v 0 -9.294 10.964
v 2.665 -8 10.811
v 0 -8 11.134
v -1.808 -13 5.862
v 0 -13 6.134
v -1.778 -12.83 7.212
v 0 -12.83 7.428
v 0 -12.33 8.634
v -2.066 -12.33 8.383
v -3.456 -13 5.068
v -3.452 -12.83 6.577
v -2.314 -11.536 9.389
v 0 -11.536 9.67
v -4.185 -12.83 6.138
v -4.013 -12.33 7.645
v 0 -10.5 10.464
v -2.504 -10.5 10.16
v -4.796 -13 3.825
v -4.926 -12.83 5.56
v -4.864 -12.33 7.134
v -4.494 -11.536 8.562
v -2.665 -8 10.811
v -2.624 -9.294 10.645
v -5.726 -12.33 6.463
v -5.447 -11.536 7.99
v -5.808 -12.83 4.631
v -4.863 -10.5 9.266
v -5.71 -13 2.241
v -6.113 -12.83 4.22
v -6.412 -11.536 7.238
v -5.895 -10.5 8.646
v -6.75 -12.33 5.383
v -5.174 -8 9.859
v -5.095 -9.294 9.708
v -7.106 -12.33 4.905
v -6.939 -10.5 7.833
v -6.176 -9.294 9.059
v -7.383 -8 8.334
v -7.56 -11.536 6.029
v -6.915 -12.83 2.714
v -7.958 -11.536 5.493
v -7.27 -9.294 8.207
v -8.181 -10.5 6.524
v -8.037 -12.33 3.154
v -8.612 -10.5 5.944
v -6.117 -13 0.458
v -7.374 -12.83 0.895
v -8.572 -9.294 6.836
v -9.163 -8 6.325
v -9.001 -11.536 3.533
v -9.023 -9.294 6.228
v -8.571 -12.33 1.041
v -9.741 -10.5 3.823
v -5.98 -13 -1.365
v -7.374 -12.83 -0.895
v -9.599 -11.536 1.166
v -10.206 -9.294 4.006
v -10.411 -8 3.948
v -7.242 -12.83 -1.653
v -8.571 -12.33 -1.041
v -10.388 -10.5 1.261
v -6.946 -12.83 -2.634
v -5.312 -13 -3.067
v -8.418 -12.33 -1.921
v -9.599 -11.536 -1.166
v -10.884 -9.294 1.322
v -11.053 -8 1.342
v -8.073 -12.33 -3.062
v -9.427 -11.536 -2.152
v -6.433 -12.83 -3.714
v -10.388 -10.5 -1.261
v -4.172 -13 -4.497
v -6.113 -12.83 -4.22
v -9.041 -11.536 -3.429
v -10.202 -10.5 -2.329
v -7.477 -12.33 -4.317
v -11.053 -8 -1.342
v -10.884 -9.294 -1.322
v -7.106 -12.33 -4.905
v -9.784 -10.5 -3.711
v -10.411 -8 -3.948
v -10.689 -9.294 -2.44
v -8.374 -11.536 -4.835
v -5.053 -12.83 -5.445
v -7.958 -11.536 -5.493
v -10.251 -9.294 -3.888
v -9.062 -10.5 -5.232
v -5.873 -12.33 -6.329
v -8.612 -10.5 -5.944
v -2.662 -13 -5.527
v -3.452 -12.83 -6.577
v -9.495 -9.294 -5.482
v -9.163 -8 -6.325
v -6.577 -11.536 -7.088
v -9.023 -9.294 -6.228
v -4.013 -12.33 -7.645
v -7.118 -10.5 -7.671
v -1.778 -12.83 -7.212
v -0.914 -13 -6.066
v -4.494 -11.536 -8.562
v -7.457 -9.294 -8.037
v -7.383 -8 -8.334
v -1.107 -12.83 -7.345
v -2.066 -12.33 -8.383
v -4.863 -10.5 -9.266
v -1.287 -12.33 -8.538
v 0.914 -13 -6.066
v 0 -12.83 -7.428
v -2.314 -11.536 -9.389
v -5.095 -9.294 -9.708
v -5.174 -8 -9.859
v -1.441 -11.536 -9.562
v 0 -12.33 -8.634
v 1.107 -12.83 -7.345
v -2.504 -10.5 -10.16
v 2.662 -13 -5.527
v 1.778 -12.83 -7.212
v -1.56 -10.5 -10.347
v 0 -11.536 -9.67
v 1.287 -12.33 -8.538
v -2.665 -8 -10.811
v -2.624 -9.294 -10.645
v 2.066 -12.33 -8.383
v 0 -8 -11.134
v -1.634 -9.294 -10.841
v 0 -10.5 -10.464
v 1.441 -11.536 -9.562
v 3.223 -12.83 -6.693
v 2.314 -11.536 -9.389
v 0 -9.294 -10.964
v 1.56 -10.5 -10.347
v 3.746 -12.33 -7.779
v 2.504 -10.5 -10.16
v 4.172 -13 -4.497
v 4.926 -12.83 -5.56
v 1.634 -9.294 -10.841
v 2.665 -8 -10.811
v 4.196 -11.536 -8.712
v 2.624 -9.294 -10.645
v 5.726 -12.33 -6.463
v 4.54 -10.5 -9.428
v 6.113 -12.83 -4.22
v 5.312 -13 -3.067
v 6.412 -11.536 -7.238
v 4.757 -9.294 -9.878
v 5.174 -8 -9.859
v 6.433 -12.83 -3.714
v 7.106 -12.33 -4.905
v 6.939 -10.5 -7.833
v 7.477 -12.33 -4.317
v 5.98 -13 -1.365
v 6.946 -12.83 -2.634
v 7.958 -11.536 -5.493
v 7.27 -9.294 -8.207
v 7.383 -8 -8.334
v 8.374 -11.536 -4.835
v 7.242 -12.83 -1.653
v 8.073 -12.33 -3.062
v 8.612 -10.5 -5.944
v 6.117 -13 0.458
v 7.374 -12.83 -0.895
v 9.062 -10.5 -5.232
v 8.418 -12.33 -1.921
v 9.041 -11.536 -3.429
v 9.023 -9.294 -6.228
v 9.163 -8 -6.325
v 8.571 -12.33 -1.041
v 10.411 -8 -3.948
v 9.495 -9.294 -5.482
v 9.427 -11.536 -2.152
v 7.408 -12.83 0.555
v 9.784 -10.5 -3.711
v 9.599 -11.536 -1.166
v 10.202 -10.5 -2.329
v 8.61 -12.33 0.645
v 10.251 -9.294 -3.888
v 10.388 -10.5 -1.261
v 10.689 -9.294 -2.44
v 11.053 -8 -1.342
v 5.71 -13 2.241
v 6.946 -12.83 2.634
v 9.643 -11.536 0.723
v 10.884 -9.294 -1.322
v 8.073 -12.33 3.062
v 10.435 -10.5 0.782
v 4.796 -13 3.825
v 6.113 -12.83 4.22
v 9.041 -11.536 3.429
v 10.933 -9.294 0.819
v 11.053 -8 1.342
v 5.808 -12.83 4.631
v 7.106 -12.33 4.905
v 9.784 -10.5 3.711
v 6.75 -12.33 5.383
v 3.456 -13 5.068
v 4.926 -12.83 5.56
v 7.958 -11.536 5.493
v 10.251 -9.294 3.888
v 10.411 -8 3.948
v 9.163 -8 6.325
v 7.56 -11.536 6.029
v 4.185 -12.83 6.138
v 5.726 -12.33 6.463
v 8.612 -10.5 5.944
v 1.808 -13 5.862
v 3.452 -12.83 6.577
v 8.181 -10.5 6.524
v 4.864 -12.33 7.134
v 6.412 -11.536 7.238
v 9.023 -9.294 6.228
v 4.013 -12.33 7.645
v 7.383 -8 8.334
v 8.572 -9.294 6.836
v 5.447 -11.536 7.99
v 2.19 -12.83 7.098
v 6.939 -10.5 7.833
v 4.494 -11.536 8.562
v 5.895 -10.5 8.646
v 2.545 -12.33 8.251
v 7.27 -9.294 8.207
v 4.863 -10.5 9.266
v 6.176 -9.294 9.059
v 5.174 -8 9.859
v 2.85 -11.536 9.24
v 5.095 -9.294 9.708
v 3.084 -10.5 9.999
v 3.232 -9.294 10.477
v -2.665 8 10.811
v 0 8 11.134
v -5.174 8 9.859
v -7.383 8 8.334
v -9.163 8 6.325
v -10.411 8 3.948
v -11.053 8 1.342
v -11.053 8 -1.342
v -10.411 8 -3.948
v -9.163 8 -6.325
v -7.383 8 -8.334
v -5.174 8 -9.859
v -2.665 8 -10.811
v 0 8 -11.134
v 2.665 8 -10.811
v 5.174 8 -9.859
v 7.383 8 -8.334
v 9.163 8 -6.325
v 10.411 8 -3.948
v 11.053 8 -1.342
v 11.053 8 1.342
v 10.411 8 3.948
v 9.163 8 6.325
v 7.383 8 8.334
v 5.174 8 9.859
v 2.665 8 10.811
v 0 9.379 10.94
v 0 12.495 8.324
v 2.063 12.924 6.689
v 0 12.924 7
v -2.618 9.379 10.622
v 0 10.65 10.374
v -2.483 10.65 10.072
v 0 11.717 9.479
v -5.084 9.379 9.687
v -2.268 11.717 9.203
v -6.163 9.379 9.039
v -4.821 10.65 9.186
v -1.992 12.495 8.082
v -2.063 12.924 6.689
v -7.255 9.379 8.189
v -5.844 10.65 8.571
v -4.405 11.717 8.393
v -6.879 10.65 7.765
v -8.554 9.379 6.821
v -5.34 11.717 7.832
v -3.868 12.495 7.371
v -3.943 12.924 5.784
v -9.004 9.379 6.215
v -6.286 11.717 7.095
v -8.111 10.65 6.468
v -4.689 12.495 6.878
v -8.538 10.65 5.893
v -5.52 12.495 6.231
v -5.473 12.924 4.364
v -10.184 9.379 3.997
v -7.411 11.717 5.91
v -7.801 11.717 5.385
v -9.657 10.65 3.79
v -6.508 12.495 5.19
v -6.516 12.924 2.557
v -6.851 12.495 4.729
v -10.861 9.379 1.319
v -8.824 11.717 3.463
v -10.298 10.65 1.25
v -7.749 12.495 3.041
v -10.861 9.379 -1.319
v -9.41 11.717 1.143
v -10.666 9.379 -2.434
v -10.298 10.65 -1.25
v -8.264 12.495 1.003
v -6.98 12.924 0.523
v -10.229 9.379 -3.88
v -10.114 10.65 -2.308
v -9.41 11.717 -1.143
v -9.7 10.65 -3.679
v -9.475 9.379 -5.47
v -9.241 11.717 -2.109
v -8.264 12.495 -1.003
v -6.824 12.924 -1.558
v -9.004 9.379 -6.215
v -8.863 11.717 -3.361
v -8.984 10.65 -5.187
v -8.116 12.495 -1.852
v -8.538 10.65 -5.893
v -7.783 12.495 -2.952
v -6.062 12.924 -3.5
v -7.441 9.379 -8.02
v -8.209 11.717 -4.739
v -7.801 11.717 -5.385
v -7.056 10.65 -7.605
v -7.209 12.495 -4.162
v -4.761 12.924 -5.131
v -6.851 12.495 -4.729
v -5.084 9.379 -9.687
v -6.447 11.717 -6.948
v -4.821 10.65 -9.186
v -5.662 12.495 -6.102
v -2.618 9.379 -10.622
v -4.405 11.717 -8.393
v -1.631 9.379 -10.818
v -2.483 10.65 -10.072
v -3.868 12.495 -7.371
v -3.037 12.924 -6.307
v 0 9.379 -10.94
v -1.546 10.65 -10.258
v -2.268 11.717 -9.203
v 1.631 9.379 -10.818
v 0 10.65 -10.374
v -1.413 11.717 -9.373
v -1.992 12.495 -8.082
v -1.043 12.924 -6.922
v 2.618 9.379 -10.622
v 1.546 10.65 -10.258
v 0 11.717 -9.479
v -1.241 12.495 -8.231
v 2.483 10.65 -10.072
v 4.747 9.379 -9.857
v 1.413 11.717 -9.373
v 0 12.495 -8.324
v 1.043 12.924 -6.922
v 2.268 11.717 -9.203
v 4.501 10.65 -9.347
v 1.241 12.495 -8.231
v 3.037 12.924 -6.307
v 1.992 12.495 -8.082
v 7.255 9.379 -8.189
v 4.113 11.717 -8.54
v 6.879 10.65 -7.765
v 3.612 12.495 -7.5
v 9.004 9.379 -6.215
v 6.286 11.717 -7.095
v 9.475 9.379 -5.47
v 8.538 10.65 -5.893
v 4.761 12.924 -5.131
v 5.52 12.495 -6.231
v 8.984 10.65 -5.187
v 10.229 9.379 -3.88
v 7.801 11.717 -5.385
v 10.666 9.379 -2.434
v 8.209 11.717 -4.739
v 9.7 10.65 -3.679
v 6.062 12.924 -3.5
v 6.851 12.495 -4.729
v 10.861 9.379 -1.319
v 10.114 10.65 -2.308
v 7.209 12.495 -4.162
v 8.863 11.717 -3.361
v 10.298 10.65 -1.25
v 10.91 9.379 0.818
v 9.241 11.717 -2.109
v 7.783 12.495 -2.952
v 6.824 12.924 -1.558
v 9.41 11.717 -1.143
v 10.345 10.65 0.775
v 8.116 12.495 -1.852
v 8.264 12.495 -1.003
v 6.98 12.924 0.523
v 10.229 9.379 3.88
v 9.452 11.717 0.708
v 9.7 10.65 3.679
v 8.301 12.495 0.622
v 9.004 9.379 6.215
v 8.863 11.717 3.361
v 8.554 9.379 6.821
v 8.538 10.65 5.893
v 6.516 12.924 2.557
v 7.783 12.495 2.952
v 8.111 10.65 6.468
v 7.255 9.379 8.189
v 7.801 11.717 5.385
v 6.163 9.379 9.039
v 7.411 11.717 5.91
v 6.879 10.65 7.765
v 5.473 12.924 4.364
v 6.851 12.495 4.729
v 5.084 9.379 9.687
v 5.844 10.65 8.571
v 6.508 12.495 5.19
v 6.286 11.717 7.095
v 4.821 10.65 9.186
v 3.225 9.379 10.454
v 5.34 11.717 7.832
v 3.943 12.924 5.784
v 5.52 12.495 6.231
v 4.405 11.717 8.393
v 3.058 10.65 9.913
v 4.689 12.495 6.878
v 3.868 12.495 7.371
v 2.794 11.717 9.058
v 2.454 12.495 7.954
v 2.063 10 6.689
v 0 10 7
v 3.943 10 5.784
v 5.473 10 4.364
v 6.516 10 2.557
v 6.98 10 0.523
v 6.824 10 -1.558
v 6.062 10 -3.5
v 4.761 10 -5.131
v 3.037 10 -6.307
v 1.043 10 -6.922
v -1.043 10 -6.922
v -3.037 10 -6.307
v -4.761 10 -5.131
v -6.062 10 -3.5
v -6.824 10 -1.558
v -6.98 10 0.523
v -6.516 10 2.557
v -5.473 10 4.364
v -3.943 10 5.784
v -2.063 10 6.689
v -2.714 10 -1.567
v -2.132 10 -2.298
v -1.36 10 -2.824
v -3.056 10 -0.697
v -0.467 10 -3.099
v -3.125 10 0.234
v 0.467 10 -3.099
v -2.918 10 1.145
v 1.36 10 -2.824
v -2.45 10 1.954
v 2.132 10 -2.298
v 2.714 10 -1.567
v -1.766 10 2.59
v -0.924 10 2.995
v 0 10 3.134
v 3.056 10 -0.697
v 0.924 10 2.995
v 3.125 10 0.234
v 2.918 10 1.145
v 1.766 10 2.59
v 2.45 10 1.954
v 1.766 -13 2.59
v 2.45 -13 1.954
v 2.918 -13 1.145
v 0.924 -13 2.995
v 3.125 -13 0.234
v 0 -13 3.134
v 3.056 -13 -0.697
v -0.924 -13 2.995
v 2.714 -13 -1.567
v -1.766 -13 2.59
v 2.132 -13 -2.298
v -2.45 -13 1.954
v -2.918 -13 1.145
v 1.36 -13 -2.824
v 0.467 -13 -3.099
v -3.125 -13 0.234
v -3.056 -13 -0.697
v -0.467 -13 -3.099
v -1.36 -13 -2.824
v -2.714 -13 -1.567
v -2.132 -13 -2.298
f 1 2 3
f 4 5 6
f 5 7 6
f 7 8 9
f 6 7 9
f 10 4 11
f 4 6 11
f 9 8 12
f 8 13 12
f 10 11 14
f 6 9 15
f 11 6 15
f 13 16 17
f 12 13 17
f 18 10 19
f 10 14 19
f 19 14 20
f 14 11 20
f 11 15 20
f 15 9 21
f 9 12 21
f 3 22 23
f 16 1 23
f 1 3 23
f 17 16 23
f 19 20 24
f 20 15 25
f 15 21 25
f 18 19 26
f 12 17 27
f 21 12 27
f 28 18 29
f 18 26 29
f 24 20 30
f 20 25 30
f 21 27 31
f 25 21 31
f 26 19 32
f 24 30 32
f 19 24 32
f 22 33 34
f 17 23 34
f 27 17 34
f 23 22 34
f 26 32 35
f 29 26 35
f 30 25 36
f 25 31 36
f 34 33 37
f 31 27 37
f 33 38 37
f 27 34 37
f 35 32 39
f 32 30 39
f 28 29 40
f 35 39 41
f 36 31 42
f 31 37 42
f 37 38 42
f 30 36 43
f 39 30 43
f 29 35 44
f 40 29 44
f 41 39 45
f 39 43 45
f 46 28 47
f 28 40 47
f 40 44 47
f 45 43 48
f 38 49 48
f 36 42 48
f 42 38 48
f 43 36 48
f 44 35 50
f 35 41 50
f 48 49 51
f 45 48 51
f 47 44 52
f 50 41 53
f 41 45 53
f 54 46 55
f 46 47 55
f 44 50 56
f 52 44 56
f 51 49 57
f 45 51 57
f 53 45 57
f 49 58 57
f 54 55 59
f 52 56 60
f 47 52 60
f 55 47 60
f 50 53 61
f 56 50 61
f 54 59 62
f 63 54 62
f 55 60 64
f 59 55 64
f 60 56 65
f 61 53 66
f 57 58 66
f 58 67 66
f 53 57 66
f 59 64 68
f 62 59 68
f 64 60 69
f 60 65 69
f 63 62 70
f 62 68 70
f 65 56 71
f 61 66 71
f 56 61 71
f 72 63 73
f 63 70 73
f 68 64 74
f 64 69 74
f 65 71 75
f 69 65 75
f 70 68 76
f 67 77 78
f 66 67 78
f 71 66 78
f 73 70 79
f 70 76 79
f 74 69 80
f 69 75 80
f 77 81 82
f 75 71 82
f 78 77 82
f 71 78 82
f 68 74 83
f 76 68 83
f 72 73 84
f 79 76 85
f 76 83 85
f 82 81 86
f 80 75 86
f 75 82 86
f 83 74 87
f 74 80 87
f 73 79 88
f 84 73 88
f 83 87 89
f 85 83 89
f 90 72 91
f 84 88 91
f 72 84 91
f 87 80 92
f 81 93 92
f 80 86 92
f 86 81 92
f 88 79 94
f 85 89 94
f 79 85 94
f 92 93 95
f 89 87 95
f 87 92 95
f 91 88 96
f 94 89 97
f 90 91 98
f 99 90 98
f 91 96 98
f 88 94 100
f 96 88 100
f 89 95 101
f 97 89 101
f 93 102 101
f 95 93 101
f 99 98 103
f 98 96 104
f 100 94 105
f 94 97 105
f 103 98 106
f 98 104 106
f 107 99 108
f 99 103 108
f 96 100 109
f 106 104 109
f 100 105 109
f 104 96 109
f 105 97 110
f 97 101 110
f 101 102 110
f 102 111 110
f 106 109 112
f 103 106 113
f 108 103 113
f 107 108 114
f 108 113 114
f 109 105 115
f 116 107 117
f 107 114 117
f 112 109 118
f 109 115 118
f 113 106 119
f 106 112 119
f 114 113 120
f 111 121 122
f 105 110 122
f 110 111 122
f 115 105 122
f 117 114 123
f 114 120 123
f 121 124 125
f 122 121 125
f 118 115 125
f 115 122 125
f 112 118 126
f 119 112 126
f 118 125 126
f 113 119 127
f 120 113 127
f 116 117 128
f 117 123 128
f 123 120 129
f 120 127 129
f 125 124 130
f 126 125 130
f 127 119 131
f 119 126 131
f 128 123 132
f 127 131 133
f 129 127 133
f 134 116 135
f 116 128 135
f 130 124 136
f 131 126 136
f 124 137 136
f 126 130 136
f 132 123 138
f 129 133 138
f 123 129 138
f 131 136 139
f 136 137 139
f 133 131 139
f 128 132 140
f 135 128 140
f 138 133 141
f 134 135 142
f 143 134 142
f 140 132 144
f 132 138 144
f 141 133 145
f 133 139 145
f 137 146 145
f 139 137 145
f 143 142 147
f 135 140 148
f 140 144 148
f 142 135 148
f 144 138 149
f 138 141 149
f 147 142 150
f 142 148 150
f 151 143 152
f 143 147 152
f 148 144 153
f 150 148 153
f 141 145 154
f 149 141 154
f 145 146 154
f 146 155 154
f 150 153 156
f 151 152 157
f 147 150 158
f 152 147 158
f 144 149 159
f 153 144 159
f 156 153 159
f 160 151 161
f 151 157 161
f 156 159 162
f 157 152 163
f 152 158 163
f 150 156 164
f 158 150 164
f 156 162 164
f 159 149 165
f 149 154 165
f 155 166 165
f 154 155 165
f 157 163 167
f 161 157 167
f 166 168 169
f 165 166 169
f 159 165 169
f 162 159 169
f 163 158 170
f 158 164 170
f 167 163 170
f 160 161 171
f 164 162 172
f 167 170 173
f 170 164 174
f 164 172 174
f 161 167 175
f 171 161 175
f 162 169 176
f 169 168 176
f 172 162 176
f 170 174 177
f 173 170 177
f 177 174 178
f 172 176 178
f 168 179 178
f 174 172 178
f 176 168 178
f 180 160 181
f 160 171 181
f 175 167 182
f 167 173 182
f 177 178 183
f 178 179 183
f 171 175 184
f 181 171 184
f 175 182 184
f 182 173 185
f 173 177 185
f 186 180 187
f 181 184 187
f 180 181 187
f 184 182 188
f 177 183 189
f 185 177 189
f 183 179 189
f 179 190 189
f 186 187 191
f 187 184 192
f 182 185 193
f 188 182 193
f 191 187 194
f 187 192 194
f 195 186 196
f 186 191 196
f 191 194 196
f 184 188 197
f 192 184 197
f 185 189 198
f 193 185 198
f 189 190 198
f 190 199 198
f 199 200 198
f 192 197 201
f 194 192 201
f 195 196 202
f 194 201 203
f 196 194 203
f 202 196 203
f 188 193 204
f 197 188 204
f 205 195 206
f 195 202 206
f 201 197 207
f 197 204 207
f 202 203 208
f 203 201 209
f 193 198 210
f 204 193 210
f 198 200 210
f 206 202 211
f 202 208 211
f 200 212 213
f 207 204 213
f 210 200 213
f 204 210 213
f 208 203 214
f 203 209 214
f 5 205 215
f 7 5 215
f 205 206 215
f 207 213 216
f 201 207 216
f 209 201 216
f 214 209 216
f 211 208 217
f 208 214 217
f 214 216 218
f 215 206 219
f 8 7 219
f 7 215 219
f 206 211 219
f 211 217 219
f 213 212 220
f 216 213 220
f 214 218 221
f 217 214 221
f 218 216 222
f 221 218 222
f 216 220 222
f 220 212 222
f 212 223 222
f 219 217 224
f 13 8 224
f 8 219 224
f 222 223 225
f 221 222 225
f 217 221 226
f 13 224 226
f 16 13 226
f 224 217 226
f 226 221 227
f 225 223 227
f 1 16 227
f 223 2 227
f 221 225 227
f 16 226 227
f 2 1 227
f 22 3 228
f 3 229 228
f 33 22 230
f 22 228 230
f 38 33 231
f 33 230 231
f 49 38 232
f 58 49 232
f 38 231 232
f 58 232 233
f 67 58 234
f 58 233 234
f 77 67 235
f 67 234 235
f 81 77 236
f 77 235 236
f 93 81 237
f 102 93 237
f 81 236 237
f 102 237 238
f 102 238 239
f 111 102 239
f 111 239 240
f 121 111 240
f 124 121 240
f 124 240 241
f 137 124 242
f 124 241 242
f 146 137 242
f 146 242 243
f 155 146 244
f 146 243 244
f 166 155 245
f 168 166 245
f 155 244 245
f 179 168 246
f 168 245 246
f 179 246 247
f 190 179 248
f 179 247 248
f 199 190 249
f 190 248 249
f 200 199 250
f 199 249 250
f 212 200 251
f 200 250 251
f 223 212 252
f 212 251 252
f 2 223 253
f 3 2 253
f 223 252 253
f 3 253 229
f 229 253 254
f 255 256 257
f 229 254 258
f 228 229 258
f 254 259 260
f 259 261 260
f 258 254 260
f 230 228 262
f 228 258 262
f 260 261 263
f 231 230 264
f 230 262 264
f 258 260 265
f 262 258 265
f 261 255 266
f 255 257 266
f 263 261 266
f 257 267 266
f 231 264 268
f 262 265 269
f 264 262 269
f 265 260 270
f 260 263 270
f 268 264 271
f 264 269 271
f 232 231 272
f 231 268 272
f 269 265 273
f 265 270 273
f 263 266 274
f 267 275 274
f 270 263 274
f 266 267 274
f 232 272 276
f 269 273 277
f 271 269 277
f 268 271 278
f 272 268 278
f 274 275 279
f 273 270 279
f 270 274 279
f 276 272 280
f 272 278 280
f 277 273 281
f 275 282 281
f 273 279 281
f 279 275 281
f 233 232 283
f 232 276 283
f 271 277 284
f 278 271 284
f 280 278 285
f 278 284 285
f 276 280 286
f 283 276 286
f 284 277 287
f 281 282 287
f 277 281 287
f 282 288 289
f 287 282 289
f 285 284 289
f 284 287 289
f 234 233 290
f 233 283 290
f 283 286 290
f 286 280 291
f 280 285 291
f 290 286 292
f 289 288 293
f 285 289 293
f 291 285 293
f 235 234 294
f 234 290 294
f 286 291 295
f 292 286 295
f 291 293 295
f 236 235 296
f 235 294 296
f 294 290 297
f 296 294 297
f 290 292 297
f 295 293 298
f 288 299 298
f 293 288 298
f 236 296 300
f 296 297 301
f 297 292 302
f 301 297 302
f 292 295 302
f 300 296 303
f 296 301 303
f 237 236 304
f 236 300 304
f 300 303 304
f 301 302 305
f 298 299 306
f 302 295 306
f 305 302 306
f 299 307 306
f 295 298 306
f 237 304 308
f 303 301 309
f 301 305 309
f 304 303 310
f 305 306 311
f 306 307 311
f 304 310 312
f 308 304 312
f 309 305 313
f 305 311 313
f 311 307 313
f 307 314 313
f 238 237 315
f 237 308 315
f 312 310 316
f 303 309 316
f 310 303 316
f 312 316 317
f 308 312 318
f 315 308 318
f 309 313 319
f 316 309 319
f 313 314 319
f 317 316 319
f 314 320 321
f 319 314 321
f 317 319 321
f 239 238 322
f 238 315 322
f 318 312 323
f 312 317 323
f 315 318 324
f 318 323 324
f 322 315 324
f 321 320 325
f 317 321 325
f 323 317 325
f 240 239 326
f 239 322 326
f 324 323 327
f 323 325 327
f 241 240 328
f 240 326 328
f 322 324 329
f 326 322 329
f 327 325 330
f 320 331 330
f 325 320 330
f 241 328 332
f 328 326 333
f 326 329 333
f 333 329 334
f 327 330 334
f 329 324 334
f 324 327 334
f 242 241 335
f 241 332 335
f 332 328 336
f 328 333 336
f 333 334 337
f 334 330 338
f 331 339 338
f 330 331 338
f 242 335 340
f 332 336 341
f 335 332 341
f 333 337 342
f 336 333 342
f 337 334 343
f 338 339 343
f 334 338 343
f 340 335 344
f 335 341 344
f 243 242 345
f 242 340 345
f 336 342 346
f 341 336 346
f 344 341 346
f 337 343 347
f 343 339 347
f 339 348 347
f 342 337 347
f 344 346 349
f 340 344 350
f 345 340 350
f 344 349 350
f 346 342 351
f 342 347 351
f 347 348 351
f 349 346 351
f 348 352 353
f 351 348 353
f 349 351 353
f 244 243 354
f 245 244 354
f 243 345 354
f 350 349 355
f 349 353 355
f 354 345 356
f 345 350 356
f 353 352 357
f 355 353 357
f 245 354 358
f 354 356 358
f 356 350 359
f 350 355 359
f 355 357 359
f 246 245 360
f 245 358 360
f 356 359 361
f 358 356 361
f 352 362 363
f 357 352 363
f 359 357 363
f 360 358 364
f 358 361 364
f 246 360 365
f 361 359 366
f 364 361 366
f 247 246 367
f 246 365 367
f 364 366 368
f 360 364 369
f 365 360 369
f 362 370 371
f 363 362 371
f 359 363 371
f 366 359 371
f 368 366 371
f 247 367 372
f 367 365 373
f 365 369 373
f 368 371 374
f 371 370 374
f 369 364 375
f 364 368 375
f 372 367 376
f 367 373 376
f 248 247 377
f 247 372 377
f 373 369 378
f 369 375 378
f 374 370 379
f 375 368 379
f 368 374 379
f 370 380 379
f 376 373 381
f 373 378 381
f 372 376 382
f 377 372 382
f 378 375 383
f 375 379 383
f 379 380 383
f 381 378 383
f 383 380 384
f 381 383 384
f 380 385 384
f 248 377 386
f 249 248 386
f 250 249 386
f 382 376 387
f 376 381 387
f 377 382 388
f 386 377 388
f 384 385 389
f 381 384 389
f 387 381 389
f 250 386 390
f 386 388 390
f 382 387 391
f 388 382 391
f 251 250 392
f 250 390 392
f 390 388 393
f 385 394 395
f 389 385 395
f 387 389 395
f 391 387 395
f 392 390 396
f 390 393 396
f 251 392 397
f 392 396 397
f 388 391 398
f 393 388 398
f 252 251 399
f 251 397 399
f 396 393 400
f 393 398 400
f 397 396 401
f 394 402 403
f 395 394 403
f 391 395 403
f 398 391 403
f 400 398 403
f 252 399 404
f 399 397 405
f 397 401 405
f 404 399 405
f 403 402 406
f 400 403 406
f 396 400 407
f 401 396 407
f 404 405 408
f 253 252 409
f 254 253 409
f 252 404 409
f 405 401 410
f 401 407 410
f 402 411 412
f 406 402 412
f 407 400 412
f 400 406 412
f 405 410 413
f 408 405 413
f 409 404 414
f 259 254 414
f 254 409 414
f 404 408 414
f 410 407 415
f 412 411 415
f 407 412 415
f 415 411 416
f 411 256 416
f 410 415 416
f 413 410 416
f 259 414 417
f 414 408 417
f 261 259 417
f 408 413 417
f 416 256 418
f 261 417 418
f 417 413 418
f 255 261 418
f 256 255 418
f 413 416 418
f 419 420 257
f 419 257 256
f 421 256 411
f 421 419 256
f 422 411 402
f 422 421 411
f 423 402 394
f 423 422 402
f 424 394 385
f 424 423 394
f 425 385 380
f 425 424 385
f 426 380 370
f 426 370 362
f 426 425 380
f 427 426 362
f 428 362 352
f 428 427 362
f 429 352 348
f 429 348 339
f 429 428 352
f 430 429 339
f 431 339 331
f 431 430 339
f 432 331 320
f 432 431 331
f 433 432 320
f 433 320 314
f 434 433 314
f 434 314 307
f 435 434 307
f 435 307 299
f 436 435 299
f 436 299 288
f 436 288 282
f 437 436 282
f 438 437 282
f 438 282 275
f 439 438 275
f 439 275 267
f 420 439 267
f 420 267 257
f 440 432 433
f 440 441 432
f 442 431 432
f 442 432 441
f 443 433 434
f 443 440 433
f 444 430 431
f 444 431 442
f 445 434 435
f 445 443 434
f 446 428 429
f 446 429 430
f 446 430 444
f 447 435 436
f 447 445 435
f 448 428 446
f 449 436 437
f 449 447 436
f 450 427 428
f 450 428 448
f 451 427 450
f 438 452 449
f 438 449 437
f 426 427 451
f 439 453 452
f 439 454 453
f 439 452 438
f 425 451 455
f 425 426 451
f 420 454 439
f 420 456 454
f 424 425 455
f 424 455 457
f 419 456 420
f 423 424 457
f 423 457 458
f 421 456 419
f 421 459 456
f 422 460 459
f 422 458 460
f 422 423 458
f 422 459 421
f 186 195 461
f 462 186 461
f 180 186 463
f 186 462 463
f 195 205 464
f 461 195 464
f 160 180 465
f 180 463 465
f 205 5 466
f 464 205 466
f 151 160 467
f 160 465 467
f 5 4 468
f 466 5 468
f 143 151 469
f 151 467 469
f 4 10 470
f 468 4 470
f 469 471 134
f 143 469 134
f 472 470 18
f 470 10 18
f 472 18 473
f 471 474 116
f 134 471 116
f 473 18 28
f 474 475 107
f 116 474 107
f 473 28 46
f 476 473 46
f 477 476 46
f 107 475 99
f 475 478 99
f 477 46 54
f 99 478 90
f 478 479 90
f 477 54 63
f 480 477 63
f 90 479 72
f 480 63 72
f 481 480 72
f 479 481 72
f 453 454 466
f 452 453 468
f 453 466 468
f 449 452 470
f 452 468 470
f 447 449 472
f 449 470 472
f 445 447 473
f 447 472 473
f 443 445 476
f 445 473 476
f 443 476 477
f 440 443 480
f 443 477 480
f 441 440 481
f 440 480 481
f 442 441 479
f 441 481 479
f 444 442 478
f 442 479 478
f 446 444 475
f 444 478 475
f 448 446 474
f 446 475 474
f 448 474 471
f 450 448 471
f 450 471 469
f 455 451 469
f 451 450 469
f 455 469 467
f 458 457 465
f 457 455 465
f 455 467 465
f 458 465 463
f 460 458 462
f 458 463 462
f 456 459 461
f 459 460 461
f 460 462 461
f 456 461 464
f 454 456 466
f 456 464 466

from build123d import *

# Parameters (mm, degrees)
CORTAR_EXTRUIR1_START = -13
CROQUIS3_R            = 7
CROQUIS3_R_2          = 3.134205676
CORTAR_EXTRUIR1_DEPTH = 13


with BuildPart() as part:
    # Croquis1 → Revolución1 (revolve)
    with BuildSketch(Plane.XY, mode=Mode.PRIVATE) as revoluci_n1_sk:
        with BuildLine():
            Line((-3.134205676, -13), (-6.134205676, -13))
            ThreePointArc((-6.134205676, -13), (-9.669739582, -11.535533906), (-11.134205676, -8))
            Line((-11.134205676, -8), (-11.134205676, 8))
            ThreePointArc((-11.134205676, 8), (-9.669739582, 11.535533906), (-6.134205676, 13))
            Line((-6.134205676, 13), (-3.134205676, 13))
            Line((-3.134205676, 13), (-3.134205676, -13))
        make_face()
    revolve(revoluci_n1_sk.sketch.rotate(Axis((0, 13, 0), (0, -1, 0)), 270), axis=Axis((0, 13, 0), (0, -1, 0)))

    # Croquis3 → Cortar-Extruir1 (cut)
    with BuildSketch(Plane(origin=(0, 23, 0), x_dir=(1, 0, 0), z_dir=(0, 1, 0)).offset(CORTAR_EXTRUIR1_START)):
        with Locations(Location((0, 0, 0), (0, 0, 270))):
            Circle(CROQUIS3_R)
        with Locations(Location((0, 0, 0), (0, 0, 270))):
            Circle(CROQUIS3_R_2, mode=Mode.SUBTRACT)
    extrude(amount=CORTAR_EXTRUIR1_DEPTH, mode=Mode.SUBTRACT)


solid = part.part
